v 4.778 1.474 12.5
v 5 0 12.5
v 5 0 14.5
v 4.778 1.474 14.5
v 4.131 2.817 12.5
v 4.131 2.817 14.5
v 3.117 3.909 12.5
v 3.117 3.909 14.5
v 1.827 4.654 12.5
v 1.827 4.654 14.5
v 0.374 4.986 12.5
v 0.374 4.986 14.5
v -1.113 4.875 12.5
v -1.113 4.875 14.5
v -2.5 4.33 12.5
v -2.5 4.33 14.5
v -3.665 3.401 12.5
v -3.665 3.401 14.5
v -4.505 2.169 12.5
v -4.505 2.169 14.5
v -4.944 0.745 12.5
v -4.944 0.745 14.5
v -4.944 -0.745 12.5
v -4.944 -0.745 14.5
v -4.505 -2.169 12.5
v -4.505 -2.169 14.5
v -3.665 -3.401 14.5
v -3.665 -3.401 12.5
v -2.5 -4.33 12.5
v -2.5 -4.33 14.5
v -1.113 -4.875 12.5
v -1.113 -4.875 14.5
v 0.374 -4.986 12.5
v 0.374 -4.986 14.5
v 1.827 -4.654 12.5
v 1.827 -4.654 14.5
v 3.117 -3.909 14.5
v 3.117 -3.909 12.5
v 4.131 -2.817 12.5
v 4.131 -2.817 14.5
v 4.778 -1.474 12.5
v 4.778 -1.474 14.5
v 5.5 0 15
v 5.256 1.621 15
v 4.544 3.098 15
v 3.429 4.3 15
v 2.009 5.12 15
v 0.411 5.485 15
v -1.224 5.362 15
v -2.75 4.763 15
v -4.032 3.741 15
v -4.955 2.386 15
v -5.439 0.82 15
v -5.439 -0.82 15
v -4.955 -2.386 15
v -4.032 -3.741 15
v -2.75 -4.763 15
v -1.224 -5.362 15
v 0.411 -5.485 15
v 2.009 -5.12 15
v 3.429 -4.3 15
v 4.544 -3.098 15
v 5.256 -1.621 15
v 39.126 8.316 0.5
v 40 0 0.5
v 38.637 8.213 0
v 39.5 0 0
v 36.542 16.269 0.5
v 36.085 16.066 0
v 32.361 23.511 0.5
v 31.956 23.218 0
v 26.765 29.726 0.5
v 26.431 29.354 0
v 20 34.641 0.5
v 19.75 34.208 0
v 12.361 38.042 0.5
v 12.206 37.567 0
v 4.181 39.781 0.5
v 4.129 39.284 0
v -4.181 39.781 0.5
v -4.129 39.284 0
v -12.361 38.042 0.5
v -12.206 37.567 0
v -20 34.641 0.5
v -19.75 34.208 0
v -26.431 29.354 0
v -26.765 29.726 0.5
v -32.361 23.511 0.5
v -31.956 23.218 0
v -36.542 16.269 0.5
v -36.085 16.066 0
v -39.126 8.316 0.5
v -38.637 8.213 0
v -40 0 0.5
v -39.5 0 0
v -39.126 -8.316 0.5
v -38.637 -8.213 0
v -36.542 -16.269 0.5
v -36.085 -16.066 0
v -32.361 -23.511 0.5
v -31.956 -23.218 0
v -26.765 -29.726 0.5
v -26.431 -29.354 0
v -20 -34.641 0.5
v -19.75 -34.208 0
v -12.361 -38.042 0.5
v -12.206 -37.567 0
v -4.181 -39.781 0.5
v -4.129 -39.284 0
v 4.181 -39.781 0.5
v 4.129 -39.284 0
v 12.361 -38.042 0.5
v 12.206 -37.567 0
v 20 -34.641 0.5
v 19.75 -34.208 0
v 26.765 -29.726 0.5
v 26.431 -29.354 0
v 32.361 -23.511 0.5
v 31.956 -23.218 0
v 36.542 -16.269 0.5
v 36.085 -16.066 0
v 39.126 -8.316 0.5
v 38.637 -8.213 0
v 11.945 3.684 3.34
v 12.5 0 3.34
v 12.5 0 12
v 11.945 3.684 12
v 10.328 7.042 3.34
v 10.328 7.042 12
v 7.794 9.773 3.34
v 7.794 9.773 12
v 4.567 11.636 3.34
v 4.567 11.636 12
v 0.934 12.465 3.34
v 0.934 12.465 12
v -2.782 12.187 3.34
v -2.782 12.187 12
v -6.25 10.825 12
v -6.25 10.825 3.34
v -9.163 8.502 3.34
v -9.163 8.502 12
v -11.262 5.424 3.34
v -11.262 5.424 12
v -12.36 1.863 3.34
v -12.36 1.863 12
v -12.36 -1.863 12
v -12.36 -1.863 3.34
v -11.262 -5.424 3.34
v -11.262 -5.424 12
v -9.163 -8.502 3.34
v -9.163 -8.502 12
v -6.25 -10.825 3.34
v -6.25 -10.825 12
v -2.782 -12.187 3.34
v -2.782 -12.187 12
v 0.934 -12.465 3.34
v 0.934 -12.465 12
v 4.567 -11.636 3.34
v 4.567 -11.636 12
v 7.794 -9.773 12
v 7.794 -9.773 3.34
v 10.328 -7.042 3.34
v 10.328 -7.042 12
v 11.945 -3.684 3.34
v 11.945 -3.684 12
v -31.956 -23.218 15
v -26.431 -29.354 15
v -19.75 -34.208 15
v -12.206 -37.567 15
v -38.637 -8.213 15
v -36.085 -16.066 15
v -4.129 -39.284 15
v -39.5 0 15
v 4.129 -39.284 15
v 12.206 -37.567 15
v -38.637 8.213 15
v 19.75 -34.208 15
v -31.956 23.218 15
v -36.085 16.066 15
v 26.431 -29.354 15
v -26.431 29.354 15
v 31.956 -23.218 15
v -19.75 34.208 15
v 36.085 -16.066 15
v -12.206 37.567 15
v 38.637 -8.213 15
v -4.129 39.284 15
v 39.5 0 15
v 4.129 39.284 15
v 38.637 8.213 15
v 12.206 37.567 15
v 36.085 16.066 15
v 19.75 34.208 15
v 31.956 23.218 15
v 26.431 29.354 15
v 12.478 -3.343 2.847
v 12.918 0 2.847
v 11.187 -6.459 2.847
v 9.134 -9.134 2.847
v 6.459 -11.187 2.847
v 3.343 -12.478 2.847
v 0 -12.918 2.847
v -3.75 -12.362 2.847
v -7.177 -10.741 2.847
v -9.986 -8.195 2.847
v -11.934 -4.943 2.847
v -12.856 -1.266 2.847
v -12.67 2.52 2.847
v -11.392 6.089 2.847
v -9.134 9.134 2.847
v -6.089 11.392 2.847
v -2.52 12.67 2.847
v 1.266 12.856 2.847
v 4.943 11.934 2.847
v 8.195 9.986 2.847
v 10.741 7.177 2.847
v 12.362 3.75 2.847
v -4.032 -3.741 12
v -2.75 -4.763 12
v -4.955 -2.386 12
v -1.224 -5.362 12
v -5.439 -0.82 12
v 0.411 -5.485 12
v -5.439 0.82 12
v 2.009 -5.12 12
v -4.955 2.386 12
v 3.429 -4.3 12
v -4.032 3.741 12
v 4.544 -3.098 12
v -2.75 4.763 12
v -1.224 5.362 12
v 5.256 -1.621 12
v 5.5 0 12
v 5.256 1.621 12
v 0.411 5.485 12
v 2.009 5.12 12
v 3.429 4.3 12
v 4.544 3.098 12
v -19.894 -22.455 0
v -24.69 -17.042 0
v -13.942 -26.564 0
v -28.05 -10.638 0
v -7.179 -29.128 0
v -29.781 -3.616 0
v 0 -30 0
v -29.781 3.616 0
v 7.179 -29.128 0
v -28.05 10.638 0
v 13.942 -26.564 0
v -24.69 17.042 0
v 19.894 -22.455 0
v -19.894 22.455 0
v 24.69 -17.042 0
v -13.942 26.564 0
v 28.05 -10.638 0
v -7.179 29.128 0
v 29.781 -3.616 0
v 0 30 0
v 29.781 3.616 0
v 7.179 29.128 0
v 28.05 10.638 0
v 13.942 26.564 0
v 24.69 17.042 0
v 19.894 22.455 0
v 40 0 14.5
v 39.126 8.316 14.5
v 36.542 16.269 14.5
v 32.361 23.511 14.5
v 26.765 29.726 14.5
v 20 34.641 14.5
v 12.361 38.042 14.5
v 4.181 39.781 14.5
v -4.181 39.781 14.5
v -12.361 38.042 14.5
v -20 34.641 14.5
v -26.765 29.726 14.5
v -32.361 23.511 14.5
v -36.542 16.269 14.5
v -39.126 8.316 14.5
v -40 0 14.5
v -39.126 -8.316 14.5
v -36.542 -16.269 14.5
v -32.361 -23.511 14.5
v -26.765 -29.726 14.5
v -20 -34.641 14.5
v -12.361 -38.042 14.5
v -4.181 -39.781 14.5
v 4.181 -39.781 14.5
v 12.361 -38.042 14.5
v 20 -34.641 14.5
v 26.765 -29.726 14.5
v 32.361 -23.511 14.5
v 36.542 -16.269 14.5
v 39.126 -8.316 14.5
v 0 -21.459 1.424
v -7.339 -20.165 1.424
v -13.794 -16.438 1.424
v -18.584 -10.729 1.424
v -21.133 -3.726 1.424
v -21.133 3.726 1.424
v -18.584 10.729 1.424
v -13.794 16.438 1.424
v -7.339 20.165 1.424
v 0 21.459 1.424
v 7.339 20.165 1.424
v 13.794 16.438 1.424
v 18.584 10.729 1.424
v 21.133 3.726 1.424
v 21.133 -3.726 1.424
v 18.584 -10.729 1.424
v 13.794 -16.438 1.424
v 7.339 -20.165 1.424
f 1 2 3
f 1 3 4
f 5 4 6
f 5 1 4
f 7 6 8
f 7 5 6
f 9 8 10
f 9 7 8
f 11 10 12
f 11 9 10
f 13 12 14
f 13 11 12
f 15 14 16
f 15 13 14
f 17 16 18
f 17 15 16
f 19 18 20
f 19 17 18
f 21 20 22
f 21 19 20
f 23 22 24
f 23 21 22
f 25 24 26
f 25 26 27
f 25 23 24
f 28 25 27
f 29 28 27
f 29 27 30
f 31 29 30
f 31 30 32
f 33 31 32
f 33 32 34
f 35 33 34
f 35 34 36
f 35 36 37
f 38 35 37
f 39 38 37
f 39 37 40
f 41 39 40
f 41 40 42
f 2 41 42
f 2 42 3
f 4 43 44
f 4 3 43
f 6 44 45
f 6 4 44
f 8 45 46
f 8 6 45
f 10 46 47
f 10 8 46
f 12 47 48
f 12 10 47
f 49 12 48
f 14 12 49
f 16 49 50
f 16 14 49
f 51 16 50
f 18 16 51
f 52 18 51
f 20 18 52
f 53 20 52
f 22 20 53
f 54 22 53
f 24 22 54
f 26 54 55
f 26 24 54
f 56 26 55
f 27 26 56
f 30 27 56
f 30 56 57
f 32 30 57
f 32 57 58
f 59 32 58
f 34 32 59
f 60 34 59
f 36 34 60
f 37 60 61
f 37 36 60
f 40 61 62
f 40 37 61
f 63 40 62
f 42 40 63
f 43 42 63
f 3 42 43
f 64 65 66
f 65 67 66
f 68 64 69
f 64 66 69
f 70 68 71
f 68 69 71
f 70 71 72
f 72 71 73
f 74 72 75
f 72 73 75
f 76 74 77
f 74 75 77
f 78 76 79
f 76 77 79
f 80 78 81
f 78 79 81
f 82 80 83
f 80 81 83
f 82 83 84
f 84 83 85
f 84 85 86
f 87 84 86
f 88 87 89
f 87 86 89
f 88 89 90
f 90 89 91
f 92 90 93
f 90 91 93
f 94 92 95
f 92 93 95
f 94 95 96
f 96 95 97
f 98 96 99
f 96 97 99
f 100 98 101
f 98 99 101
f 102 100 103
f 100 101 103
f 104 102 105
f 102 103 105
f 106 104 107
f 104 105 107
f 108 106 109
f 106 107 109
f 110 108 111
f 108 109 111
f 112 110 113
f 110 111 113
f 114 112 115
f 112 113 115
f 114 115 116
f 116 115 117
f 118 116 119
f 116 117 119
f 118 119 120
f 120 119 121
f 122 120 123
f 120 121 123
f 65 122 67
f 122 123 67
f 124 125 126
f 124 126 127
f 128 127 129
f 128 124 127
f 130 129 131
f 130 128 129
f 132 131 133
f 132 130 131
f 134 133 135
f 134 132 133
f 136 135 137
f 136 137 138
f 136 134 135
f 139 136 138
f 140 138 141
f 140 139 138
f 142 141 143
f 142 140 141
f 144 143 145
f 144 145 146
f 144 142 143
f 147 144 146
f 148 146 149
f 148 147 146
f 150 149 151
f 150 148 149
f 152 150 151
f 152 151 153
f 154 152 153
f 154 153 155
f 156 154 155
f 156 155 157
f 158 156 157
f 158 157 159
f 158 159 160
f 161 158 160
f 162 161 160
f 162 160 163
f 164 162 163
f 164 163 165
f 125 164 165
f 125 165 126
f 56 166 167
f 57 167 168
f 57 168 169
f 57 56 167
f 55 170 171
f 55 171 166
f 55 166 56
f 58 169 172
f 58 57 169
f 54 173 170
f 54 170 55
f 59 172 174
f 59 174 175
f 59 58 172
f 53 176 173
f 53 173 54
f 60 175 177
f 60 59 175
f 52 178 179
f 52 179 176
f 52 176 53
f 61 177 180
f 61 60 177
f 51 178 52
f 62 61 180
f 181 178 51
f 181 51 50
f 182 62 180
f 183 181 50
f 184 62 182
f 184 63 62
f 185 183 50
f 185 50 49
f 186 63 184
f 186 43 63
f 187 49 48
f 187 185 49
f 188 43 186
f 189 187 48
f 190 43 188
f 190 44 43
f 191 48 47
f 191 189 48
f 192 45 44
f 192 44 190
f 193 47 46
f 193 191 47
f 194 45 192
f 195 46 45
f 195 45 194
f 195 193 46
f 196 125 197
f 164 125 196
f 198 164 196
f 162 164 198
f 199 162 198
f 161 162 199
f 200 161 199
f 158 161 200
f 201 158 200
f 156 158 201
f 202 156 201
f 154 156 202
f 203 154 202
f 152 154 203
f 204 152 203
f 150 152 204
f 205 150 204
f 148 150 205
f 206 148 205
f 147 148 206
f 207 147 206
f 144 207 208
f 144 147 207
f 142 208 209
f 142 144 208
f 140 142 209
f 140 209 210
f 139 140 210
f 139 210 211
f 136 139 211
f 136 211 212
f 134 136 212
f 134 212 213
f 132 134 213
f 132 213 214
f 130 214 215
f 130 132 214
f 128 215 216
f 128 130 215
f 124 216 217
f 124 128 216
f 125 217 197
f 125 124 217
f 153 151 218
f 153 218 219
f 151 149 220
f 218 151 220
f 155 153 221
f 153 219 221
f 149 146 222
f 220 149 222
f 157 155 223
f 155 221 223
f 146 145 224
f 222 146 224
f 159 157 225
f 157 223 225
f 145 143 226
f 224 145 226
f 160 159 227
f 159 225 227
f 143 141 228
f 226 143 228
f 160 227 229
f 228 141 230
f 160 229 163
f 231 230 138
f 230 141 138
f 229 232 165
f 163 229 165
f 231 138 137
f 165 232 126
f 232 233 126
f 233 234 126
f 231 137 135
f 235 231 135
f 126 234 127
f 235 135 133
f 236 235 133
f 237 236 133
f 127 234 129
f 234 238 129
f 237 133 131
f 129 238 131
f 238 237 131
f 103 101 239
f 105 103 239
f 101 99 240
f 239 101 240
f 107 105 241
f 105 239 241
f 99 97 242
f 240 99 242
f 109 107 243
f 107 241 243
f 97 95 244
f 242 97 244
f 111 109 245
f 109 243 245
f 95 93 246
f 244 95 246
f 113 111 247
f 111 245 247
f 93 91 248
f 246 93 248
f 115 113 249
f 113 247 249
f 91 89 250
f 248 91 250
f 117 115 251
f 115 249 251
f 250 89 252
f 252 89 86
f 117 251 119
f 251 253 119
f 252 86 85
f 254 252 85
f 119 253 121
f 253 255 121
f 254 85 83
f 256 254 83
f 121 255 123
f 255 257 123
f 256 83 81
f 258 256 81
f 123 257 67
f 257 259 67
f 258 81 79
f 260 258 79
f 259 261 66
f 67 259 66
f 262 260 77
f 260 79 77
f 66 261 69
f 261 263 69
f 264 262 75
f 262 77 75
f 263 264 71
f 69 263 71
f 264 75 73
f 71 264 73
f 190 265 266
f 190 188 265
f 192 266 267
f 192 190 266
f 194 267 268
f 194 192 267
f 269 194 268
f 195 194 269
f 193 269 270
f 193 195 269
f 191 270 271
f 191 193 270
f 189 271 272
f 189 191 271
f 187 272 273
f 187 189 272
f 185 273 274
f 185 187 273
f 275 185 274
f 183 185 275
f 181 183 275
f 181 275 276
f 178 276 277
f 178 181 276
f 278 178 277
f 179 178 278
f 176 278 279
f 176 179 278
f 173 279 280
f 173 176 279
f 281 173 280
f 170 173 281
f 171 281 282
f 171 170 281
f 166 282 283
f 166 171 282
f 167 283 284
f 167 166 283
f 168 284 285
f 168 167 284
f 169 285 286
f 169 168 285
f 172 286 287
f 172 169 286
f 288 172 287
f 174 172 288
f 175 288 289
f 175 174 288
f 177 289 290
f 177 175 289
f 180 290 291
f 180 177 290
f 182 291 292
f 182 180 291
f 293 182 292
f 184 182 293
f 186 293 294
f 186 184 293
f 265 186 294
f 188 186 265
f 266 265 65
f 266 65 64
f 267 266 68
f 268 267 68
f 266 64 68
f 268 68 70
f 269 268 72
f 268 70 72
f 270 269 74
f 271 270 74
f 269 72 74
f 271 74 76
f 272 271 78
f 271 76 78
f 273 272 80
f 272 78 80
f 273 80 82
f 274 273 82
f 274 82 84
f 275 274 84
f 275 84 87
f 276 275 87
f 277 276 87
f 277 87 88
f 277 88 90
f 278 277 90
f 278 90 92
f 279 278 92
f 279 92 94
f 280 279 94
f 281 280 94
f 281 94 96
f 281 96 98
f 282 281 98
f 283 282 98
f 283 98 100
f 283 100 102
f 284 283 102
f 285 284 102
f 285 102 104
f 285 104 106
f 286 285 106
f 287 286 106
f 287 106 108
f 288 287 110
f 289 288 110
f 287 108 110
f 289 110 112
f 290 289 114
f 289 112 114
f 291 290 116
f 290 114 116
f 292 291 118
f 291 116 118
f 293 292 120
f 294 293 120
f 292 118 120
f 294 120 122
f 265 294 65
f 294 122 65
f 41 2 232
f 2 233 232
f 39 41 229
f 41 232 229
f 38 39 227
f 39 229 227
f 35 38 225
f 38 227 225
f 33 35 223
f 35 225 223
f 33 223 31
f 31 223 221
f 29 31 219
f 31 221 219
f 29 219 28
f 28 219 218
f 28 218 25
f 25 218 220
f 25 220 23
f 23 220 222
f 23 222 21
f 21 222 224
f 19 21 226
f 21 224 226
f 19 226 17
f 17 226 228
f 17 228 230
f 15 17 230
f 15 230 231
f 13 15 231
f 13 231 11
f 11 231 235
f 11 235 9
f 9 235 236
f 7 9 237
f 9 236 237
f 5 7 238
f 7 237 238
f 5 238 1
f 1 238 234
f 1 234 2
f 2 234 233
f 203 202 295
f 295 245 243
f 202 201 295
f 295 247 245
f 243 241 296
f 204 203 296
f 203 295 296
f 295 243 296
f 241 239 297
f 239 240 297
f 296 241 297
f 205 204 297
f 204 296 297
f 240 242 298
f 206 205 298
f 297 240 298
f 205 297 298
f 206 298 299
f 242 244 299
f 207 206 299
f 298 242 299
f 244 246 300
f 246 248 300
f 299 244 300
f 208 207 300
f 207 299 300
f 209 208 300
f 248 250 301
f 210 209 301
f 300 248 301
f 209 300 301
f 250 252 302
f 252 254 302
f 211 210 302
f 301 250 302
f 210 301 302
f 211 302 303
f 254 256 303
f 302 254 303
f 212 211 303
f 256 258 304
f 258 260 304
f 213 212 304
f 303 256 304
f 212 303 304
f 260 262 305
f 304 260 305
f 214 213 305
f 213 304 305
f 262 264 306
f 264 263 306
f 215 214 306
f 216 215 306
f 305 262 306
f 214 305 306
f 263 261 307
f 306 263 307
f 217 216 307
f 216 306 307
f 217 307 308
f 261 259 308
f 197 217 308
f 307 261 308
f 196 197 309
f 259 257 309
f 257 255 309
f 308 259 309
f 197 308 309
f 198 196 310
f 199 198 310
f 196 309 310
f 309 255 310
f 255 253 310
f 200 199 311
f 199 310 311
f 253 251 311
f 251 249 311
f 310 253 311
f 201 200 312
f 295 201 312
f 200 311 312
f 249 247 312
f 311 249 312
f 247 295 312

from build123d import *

# Parameters (mm, degrees)
F0_R        = 40
F0_R_2      = 5
F1_DEPTH    = 15
F4_R        = 12.5
F5_DEPTH    = 12
F6_T6_ANGLE = 90
F6_T8_ANGLE = 270


# Not quite as in the source:
# - a fillet or chamfer that OpenCascade refuses, or shapes differently, is made with other operations: its cross-section is extruded or revolved along the edge and cut away or added


with BuildPart() as f1:
    # F0 (on Top) → F1 (new body)
    with BuildSketch(Plane.XY):
        Circle(F0_R)
        Circle(F0_R_2, mode=Mode.SUBTRACT)
    extrude(amount=F1_DEPTH)

    # F2 (on Right) → F3 (revolve, cut)
    with BuildSketch(Plane.YZ):
        Polygon((-30, 0), (0, 0), (0, 5), align=None)
    revolve(axis=Axis((0, 0, -3.8595963269), (0, 0, -1)), mode=Mode.SUBTRACT)

    # F4 (on Top) → F5 (cut)
    with BuildSketch(Plane.XY):
        Circle(F4_R)
    extrude(amount=F5_DEPTH, mode=Mode.SUBTRACT)

    # F6: chamfer of 0.5 on 6 edges, made by hand

    # F6_s1 → F6_t2 (revolve, cut)
    with BuildSketch(Plane.XZ):
        Polygon((40, 14.5), (39.5, 15), (40, 15), align=None)
    revolve(axis=Axis((0, 0, 15), (0, 0, 1)), mode=Mode.SUBTRACT)

    # F6_s3 → F6_t4 (revolve, cut)
    with BuildSketch(Plane.XZ):
        Polygon((40, 0.5), (39.5, 0), (40, 0), align=None)
    revolve(axis=Axis((0, 0, 0), (0, 0, 1)), mode=Mode.SUBTRACT)

    # F6_s5 → F6_t6 (revolve, cut)
    with BuildSketch(Plane.XZ):
        Polygon((12.9178005063, 2.8470332489), (12.5, 3.3402302109), (12.5, 2.9166666667), align=None)
    revolve(axis=Axis((0, 0, 2.9166666667), (0, 0, -1)), revolution_arc=F6_T6_ANGLE, mode=Mode.SUBTRACT)

    # F6_s7 → F6_t8 (revolve, cut)
    with BuildSketch(Plane.YZ):
        Polygon((-12.9178005063, 2.8470332489), (-12.5, 3.3402302109), (-12.5, 2.9166666667), align=None)
    revolve(axis=Axis((0, 0, 2.9166666667), (0, 0, -1)), revolution_arc=F6_T8_ANGLE, mode=Mode.SUBTRACT)

    # F6_s9 → F6_t10 (revolve, cut)
    with BuildSketch(Plane.XZ):
        Polygon((5, 12.5), (5.5, 12), (5, 12), align=None)
    revolve(axis=Axis((0, 0, 12), (0, 0, -1)), mode=Mode.SUBTRACT)

    # F6_s11 → F6_t12 (revolve, cut)
    with BuildSketch(Plane.XZ):
        Polygon((5.5, 15), (5, 14.5), (5, 15), align=None)
    revolve(axis=Axis((0, 0, 15), (0, 0, 1)), mode=Mode.SUBTRACT)


solid = f1.part
